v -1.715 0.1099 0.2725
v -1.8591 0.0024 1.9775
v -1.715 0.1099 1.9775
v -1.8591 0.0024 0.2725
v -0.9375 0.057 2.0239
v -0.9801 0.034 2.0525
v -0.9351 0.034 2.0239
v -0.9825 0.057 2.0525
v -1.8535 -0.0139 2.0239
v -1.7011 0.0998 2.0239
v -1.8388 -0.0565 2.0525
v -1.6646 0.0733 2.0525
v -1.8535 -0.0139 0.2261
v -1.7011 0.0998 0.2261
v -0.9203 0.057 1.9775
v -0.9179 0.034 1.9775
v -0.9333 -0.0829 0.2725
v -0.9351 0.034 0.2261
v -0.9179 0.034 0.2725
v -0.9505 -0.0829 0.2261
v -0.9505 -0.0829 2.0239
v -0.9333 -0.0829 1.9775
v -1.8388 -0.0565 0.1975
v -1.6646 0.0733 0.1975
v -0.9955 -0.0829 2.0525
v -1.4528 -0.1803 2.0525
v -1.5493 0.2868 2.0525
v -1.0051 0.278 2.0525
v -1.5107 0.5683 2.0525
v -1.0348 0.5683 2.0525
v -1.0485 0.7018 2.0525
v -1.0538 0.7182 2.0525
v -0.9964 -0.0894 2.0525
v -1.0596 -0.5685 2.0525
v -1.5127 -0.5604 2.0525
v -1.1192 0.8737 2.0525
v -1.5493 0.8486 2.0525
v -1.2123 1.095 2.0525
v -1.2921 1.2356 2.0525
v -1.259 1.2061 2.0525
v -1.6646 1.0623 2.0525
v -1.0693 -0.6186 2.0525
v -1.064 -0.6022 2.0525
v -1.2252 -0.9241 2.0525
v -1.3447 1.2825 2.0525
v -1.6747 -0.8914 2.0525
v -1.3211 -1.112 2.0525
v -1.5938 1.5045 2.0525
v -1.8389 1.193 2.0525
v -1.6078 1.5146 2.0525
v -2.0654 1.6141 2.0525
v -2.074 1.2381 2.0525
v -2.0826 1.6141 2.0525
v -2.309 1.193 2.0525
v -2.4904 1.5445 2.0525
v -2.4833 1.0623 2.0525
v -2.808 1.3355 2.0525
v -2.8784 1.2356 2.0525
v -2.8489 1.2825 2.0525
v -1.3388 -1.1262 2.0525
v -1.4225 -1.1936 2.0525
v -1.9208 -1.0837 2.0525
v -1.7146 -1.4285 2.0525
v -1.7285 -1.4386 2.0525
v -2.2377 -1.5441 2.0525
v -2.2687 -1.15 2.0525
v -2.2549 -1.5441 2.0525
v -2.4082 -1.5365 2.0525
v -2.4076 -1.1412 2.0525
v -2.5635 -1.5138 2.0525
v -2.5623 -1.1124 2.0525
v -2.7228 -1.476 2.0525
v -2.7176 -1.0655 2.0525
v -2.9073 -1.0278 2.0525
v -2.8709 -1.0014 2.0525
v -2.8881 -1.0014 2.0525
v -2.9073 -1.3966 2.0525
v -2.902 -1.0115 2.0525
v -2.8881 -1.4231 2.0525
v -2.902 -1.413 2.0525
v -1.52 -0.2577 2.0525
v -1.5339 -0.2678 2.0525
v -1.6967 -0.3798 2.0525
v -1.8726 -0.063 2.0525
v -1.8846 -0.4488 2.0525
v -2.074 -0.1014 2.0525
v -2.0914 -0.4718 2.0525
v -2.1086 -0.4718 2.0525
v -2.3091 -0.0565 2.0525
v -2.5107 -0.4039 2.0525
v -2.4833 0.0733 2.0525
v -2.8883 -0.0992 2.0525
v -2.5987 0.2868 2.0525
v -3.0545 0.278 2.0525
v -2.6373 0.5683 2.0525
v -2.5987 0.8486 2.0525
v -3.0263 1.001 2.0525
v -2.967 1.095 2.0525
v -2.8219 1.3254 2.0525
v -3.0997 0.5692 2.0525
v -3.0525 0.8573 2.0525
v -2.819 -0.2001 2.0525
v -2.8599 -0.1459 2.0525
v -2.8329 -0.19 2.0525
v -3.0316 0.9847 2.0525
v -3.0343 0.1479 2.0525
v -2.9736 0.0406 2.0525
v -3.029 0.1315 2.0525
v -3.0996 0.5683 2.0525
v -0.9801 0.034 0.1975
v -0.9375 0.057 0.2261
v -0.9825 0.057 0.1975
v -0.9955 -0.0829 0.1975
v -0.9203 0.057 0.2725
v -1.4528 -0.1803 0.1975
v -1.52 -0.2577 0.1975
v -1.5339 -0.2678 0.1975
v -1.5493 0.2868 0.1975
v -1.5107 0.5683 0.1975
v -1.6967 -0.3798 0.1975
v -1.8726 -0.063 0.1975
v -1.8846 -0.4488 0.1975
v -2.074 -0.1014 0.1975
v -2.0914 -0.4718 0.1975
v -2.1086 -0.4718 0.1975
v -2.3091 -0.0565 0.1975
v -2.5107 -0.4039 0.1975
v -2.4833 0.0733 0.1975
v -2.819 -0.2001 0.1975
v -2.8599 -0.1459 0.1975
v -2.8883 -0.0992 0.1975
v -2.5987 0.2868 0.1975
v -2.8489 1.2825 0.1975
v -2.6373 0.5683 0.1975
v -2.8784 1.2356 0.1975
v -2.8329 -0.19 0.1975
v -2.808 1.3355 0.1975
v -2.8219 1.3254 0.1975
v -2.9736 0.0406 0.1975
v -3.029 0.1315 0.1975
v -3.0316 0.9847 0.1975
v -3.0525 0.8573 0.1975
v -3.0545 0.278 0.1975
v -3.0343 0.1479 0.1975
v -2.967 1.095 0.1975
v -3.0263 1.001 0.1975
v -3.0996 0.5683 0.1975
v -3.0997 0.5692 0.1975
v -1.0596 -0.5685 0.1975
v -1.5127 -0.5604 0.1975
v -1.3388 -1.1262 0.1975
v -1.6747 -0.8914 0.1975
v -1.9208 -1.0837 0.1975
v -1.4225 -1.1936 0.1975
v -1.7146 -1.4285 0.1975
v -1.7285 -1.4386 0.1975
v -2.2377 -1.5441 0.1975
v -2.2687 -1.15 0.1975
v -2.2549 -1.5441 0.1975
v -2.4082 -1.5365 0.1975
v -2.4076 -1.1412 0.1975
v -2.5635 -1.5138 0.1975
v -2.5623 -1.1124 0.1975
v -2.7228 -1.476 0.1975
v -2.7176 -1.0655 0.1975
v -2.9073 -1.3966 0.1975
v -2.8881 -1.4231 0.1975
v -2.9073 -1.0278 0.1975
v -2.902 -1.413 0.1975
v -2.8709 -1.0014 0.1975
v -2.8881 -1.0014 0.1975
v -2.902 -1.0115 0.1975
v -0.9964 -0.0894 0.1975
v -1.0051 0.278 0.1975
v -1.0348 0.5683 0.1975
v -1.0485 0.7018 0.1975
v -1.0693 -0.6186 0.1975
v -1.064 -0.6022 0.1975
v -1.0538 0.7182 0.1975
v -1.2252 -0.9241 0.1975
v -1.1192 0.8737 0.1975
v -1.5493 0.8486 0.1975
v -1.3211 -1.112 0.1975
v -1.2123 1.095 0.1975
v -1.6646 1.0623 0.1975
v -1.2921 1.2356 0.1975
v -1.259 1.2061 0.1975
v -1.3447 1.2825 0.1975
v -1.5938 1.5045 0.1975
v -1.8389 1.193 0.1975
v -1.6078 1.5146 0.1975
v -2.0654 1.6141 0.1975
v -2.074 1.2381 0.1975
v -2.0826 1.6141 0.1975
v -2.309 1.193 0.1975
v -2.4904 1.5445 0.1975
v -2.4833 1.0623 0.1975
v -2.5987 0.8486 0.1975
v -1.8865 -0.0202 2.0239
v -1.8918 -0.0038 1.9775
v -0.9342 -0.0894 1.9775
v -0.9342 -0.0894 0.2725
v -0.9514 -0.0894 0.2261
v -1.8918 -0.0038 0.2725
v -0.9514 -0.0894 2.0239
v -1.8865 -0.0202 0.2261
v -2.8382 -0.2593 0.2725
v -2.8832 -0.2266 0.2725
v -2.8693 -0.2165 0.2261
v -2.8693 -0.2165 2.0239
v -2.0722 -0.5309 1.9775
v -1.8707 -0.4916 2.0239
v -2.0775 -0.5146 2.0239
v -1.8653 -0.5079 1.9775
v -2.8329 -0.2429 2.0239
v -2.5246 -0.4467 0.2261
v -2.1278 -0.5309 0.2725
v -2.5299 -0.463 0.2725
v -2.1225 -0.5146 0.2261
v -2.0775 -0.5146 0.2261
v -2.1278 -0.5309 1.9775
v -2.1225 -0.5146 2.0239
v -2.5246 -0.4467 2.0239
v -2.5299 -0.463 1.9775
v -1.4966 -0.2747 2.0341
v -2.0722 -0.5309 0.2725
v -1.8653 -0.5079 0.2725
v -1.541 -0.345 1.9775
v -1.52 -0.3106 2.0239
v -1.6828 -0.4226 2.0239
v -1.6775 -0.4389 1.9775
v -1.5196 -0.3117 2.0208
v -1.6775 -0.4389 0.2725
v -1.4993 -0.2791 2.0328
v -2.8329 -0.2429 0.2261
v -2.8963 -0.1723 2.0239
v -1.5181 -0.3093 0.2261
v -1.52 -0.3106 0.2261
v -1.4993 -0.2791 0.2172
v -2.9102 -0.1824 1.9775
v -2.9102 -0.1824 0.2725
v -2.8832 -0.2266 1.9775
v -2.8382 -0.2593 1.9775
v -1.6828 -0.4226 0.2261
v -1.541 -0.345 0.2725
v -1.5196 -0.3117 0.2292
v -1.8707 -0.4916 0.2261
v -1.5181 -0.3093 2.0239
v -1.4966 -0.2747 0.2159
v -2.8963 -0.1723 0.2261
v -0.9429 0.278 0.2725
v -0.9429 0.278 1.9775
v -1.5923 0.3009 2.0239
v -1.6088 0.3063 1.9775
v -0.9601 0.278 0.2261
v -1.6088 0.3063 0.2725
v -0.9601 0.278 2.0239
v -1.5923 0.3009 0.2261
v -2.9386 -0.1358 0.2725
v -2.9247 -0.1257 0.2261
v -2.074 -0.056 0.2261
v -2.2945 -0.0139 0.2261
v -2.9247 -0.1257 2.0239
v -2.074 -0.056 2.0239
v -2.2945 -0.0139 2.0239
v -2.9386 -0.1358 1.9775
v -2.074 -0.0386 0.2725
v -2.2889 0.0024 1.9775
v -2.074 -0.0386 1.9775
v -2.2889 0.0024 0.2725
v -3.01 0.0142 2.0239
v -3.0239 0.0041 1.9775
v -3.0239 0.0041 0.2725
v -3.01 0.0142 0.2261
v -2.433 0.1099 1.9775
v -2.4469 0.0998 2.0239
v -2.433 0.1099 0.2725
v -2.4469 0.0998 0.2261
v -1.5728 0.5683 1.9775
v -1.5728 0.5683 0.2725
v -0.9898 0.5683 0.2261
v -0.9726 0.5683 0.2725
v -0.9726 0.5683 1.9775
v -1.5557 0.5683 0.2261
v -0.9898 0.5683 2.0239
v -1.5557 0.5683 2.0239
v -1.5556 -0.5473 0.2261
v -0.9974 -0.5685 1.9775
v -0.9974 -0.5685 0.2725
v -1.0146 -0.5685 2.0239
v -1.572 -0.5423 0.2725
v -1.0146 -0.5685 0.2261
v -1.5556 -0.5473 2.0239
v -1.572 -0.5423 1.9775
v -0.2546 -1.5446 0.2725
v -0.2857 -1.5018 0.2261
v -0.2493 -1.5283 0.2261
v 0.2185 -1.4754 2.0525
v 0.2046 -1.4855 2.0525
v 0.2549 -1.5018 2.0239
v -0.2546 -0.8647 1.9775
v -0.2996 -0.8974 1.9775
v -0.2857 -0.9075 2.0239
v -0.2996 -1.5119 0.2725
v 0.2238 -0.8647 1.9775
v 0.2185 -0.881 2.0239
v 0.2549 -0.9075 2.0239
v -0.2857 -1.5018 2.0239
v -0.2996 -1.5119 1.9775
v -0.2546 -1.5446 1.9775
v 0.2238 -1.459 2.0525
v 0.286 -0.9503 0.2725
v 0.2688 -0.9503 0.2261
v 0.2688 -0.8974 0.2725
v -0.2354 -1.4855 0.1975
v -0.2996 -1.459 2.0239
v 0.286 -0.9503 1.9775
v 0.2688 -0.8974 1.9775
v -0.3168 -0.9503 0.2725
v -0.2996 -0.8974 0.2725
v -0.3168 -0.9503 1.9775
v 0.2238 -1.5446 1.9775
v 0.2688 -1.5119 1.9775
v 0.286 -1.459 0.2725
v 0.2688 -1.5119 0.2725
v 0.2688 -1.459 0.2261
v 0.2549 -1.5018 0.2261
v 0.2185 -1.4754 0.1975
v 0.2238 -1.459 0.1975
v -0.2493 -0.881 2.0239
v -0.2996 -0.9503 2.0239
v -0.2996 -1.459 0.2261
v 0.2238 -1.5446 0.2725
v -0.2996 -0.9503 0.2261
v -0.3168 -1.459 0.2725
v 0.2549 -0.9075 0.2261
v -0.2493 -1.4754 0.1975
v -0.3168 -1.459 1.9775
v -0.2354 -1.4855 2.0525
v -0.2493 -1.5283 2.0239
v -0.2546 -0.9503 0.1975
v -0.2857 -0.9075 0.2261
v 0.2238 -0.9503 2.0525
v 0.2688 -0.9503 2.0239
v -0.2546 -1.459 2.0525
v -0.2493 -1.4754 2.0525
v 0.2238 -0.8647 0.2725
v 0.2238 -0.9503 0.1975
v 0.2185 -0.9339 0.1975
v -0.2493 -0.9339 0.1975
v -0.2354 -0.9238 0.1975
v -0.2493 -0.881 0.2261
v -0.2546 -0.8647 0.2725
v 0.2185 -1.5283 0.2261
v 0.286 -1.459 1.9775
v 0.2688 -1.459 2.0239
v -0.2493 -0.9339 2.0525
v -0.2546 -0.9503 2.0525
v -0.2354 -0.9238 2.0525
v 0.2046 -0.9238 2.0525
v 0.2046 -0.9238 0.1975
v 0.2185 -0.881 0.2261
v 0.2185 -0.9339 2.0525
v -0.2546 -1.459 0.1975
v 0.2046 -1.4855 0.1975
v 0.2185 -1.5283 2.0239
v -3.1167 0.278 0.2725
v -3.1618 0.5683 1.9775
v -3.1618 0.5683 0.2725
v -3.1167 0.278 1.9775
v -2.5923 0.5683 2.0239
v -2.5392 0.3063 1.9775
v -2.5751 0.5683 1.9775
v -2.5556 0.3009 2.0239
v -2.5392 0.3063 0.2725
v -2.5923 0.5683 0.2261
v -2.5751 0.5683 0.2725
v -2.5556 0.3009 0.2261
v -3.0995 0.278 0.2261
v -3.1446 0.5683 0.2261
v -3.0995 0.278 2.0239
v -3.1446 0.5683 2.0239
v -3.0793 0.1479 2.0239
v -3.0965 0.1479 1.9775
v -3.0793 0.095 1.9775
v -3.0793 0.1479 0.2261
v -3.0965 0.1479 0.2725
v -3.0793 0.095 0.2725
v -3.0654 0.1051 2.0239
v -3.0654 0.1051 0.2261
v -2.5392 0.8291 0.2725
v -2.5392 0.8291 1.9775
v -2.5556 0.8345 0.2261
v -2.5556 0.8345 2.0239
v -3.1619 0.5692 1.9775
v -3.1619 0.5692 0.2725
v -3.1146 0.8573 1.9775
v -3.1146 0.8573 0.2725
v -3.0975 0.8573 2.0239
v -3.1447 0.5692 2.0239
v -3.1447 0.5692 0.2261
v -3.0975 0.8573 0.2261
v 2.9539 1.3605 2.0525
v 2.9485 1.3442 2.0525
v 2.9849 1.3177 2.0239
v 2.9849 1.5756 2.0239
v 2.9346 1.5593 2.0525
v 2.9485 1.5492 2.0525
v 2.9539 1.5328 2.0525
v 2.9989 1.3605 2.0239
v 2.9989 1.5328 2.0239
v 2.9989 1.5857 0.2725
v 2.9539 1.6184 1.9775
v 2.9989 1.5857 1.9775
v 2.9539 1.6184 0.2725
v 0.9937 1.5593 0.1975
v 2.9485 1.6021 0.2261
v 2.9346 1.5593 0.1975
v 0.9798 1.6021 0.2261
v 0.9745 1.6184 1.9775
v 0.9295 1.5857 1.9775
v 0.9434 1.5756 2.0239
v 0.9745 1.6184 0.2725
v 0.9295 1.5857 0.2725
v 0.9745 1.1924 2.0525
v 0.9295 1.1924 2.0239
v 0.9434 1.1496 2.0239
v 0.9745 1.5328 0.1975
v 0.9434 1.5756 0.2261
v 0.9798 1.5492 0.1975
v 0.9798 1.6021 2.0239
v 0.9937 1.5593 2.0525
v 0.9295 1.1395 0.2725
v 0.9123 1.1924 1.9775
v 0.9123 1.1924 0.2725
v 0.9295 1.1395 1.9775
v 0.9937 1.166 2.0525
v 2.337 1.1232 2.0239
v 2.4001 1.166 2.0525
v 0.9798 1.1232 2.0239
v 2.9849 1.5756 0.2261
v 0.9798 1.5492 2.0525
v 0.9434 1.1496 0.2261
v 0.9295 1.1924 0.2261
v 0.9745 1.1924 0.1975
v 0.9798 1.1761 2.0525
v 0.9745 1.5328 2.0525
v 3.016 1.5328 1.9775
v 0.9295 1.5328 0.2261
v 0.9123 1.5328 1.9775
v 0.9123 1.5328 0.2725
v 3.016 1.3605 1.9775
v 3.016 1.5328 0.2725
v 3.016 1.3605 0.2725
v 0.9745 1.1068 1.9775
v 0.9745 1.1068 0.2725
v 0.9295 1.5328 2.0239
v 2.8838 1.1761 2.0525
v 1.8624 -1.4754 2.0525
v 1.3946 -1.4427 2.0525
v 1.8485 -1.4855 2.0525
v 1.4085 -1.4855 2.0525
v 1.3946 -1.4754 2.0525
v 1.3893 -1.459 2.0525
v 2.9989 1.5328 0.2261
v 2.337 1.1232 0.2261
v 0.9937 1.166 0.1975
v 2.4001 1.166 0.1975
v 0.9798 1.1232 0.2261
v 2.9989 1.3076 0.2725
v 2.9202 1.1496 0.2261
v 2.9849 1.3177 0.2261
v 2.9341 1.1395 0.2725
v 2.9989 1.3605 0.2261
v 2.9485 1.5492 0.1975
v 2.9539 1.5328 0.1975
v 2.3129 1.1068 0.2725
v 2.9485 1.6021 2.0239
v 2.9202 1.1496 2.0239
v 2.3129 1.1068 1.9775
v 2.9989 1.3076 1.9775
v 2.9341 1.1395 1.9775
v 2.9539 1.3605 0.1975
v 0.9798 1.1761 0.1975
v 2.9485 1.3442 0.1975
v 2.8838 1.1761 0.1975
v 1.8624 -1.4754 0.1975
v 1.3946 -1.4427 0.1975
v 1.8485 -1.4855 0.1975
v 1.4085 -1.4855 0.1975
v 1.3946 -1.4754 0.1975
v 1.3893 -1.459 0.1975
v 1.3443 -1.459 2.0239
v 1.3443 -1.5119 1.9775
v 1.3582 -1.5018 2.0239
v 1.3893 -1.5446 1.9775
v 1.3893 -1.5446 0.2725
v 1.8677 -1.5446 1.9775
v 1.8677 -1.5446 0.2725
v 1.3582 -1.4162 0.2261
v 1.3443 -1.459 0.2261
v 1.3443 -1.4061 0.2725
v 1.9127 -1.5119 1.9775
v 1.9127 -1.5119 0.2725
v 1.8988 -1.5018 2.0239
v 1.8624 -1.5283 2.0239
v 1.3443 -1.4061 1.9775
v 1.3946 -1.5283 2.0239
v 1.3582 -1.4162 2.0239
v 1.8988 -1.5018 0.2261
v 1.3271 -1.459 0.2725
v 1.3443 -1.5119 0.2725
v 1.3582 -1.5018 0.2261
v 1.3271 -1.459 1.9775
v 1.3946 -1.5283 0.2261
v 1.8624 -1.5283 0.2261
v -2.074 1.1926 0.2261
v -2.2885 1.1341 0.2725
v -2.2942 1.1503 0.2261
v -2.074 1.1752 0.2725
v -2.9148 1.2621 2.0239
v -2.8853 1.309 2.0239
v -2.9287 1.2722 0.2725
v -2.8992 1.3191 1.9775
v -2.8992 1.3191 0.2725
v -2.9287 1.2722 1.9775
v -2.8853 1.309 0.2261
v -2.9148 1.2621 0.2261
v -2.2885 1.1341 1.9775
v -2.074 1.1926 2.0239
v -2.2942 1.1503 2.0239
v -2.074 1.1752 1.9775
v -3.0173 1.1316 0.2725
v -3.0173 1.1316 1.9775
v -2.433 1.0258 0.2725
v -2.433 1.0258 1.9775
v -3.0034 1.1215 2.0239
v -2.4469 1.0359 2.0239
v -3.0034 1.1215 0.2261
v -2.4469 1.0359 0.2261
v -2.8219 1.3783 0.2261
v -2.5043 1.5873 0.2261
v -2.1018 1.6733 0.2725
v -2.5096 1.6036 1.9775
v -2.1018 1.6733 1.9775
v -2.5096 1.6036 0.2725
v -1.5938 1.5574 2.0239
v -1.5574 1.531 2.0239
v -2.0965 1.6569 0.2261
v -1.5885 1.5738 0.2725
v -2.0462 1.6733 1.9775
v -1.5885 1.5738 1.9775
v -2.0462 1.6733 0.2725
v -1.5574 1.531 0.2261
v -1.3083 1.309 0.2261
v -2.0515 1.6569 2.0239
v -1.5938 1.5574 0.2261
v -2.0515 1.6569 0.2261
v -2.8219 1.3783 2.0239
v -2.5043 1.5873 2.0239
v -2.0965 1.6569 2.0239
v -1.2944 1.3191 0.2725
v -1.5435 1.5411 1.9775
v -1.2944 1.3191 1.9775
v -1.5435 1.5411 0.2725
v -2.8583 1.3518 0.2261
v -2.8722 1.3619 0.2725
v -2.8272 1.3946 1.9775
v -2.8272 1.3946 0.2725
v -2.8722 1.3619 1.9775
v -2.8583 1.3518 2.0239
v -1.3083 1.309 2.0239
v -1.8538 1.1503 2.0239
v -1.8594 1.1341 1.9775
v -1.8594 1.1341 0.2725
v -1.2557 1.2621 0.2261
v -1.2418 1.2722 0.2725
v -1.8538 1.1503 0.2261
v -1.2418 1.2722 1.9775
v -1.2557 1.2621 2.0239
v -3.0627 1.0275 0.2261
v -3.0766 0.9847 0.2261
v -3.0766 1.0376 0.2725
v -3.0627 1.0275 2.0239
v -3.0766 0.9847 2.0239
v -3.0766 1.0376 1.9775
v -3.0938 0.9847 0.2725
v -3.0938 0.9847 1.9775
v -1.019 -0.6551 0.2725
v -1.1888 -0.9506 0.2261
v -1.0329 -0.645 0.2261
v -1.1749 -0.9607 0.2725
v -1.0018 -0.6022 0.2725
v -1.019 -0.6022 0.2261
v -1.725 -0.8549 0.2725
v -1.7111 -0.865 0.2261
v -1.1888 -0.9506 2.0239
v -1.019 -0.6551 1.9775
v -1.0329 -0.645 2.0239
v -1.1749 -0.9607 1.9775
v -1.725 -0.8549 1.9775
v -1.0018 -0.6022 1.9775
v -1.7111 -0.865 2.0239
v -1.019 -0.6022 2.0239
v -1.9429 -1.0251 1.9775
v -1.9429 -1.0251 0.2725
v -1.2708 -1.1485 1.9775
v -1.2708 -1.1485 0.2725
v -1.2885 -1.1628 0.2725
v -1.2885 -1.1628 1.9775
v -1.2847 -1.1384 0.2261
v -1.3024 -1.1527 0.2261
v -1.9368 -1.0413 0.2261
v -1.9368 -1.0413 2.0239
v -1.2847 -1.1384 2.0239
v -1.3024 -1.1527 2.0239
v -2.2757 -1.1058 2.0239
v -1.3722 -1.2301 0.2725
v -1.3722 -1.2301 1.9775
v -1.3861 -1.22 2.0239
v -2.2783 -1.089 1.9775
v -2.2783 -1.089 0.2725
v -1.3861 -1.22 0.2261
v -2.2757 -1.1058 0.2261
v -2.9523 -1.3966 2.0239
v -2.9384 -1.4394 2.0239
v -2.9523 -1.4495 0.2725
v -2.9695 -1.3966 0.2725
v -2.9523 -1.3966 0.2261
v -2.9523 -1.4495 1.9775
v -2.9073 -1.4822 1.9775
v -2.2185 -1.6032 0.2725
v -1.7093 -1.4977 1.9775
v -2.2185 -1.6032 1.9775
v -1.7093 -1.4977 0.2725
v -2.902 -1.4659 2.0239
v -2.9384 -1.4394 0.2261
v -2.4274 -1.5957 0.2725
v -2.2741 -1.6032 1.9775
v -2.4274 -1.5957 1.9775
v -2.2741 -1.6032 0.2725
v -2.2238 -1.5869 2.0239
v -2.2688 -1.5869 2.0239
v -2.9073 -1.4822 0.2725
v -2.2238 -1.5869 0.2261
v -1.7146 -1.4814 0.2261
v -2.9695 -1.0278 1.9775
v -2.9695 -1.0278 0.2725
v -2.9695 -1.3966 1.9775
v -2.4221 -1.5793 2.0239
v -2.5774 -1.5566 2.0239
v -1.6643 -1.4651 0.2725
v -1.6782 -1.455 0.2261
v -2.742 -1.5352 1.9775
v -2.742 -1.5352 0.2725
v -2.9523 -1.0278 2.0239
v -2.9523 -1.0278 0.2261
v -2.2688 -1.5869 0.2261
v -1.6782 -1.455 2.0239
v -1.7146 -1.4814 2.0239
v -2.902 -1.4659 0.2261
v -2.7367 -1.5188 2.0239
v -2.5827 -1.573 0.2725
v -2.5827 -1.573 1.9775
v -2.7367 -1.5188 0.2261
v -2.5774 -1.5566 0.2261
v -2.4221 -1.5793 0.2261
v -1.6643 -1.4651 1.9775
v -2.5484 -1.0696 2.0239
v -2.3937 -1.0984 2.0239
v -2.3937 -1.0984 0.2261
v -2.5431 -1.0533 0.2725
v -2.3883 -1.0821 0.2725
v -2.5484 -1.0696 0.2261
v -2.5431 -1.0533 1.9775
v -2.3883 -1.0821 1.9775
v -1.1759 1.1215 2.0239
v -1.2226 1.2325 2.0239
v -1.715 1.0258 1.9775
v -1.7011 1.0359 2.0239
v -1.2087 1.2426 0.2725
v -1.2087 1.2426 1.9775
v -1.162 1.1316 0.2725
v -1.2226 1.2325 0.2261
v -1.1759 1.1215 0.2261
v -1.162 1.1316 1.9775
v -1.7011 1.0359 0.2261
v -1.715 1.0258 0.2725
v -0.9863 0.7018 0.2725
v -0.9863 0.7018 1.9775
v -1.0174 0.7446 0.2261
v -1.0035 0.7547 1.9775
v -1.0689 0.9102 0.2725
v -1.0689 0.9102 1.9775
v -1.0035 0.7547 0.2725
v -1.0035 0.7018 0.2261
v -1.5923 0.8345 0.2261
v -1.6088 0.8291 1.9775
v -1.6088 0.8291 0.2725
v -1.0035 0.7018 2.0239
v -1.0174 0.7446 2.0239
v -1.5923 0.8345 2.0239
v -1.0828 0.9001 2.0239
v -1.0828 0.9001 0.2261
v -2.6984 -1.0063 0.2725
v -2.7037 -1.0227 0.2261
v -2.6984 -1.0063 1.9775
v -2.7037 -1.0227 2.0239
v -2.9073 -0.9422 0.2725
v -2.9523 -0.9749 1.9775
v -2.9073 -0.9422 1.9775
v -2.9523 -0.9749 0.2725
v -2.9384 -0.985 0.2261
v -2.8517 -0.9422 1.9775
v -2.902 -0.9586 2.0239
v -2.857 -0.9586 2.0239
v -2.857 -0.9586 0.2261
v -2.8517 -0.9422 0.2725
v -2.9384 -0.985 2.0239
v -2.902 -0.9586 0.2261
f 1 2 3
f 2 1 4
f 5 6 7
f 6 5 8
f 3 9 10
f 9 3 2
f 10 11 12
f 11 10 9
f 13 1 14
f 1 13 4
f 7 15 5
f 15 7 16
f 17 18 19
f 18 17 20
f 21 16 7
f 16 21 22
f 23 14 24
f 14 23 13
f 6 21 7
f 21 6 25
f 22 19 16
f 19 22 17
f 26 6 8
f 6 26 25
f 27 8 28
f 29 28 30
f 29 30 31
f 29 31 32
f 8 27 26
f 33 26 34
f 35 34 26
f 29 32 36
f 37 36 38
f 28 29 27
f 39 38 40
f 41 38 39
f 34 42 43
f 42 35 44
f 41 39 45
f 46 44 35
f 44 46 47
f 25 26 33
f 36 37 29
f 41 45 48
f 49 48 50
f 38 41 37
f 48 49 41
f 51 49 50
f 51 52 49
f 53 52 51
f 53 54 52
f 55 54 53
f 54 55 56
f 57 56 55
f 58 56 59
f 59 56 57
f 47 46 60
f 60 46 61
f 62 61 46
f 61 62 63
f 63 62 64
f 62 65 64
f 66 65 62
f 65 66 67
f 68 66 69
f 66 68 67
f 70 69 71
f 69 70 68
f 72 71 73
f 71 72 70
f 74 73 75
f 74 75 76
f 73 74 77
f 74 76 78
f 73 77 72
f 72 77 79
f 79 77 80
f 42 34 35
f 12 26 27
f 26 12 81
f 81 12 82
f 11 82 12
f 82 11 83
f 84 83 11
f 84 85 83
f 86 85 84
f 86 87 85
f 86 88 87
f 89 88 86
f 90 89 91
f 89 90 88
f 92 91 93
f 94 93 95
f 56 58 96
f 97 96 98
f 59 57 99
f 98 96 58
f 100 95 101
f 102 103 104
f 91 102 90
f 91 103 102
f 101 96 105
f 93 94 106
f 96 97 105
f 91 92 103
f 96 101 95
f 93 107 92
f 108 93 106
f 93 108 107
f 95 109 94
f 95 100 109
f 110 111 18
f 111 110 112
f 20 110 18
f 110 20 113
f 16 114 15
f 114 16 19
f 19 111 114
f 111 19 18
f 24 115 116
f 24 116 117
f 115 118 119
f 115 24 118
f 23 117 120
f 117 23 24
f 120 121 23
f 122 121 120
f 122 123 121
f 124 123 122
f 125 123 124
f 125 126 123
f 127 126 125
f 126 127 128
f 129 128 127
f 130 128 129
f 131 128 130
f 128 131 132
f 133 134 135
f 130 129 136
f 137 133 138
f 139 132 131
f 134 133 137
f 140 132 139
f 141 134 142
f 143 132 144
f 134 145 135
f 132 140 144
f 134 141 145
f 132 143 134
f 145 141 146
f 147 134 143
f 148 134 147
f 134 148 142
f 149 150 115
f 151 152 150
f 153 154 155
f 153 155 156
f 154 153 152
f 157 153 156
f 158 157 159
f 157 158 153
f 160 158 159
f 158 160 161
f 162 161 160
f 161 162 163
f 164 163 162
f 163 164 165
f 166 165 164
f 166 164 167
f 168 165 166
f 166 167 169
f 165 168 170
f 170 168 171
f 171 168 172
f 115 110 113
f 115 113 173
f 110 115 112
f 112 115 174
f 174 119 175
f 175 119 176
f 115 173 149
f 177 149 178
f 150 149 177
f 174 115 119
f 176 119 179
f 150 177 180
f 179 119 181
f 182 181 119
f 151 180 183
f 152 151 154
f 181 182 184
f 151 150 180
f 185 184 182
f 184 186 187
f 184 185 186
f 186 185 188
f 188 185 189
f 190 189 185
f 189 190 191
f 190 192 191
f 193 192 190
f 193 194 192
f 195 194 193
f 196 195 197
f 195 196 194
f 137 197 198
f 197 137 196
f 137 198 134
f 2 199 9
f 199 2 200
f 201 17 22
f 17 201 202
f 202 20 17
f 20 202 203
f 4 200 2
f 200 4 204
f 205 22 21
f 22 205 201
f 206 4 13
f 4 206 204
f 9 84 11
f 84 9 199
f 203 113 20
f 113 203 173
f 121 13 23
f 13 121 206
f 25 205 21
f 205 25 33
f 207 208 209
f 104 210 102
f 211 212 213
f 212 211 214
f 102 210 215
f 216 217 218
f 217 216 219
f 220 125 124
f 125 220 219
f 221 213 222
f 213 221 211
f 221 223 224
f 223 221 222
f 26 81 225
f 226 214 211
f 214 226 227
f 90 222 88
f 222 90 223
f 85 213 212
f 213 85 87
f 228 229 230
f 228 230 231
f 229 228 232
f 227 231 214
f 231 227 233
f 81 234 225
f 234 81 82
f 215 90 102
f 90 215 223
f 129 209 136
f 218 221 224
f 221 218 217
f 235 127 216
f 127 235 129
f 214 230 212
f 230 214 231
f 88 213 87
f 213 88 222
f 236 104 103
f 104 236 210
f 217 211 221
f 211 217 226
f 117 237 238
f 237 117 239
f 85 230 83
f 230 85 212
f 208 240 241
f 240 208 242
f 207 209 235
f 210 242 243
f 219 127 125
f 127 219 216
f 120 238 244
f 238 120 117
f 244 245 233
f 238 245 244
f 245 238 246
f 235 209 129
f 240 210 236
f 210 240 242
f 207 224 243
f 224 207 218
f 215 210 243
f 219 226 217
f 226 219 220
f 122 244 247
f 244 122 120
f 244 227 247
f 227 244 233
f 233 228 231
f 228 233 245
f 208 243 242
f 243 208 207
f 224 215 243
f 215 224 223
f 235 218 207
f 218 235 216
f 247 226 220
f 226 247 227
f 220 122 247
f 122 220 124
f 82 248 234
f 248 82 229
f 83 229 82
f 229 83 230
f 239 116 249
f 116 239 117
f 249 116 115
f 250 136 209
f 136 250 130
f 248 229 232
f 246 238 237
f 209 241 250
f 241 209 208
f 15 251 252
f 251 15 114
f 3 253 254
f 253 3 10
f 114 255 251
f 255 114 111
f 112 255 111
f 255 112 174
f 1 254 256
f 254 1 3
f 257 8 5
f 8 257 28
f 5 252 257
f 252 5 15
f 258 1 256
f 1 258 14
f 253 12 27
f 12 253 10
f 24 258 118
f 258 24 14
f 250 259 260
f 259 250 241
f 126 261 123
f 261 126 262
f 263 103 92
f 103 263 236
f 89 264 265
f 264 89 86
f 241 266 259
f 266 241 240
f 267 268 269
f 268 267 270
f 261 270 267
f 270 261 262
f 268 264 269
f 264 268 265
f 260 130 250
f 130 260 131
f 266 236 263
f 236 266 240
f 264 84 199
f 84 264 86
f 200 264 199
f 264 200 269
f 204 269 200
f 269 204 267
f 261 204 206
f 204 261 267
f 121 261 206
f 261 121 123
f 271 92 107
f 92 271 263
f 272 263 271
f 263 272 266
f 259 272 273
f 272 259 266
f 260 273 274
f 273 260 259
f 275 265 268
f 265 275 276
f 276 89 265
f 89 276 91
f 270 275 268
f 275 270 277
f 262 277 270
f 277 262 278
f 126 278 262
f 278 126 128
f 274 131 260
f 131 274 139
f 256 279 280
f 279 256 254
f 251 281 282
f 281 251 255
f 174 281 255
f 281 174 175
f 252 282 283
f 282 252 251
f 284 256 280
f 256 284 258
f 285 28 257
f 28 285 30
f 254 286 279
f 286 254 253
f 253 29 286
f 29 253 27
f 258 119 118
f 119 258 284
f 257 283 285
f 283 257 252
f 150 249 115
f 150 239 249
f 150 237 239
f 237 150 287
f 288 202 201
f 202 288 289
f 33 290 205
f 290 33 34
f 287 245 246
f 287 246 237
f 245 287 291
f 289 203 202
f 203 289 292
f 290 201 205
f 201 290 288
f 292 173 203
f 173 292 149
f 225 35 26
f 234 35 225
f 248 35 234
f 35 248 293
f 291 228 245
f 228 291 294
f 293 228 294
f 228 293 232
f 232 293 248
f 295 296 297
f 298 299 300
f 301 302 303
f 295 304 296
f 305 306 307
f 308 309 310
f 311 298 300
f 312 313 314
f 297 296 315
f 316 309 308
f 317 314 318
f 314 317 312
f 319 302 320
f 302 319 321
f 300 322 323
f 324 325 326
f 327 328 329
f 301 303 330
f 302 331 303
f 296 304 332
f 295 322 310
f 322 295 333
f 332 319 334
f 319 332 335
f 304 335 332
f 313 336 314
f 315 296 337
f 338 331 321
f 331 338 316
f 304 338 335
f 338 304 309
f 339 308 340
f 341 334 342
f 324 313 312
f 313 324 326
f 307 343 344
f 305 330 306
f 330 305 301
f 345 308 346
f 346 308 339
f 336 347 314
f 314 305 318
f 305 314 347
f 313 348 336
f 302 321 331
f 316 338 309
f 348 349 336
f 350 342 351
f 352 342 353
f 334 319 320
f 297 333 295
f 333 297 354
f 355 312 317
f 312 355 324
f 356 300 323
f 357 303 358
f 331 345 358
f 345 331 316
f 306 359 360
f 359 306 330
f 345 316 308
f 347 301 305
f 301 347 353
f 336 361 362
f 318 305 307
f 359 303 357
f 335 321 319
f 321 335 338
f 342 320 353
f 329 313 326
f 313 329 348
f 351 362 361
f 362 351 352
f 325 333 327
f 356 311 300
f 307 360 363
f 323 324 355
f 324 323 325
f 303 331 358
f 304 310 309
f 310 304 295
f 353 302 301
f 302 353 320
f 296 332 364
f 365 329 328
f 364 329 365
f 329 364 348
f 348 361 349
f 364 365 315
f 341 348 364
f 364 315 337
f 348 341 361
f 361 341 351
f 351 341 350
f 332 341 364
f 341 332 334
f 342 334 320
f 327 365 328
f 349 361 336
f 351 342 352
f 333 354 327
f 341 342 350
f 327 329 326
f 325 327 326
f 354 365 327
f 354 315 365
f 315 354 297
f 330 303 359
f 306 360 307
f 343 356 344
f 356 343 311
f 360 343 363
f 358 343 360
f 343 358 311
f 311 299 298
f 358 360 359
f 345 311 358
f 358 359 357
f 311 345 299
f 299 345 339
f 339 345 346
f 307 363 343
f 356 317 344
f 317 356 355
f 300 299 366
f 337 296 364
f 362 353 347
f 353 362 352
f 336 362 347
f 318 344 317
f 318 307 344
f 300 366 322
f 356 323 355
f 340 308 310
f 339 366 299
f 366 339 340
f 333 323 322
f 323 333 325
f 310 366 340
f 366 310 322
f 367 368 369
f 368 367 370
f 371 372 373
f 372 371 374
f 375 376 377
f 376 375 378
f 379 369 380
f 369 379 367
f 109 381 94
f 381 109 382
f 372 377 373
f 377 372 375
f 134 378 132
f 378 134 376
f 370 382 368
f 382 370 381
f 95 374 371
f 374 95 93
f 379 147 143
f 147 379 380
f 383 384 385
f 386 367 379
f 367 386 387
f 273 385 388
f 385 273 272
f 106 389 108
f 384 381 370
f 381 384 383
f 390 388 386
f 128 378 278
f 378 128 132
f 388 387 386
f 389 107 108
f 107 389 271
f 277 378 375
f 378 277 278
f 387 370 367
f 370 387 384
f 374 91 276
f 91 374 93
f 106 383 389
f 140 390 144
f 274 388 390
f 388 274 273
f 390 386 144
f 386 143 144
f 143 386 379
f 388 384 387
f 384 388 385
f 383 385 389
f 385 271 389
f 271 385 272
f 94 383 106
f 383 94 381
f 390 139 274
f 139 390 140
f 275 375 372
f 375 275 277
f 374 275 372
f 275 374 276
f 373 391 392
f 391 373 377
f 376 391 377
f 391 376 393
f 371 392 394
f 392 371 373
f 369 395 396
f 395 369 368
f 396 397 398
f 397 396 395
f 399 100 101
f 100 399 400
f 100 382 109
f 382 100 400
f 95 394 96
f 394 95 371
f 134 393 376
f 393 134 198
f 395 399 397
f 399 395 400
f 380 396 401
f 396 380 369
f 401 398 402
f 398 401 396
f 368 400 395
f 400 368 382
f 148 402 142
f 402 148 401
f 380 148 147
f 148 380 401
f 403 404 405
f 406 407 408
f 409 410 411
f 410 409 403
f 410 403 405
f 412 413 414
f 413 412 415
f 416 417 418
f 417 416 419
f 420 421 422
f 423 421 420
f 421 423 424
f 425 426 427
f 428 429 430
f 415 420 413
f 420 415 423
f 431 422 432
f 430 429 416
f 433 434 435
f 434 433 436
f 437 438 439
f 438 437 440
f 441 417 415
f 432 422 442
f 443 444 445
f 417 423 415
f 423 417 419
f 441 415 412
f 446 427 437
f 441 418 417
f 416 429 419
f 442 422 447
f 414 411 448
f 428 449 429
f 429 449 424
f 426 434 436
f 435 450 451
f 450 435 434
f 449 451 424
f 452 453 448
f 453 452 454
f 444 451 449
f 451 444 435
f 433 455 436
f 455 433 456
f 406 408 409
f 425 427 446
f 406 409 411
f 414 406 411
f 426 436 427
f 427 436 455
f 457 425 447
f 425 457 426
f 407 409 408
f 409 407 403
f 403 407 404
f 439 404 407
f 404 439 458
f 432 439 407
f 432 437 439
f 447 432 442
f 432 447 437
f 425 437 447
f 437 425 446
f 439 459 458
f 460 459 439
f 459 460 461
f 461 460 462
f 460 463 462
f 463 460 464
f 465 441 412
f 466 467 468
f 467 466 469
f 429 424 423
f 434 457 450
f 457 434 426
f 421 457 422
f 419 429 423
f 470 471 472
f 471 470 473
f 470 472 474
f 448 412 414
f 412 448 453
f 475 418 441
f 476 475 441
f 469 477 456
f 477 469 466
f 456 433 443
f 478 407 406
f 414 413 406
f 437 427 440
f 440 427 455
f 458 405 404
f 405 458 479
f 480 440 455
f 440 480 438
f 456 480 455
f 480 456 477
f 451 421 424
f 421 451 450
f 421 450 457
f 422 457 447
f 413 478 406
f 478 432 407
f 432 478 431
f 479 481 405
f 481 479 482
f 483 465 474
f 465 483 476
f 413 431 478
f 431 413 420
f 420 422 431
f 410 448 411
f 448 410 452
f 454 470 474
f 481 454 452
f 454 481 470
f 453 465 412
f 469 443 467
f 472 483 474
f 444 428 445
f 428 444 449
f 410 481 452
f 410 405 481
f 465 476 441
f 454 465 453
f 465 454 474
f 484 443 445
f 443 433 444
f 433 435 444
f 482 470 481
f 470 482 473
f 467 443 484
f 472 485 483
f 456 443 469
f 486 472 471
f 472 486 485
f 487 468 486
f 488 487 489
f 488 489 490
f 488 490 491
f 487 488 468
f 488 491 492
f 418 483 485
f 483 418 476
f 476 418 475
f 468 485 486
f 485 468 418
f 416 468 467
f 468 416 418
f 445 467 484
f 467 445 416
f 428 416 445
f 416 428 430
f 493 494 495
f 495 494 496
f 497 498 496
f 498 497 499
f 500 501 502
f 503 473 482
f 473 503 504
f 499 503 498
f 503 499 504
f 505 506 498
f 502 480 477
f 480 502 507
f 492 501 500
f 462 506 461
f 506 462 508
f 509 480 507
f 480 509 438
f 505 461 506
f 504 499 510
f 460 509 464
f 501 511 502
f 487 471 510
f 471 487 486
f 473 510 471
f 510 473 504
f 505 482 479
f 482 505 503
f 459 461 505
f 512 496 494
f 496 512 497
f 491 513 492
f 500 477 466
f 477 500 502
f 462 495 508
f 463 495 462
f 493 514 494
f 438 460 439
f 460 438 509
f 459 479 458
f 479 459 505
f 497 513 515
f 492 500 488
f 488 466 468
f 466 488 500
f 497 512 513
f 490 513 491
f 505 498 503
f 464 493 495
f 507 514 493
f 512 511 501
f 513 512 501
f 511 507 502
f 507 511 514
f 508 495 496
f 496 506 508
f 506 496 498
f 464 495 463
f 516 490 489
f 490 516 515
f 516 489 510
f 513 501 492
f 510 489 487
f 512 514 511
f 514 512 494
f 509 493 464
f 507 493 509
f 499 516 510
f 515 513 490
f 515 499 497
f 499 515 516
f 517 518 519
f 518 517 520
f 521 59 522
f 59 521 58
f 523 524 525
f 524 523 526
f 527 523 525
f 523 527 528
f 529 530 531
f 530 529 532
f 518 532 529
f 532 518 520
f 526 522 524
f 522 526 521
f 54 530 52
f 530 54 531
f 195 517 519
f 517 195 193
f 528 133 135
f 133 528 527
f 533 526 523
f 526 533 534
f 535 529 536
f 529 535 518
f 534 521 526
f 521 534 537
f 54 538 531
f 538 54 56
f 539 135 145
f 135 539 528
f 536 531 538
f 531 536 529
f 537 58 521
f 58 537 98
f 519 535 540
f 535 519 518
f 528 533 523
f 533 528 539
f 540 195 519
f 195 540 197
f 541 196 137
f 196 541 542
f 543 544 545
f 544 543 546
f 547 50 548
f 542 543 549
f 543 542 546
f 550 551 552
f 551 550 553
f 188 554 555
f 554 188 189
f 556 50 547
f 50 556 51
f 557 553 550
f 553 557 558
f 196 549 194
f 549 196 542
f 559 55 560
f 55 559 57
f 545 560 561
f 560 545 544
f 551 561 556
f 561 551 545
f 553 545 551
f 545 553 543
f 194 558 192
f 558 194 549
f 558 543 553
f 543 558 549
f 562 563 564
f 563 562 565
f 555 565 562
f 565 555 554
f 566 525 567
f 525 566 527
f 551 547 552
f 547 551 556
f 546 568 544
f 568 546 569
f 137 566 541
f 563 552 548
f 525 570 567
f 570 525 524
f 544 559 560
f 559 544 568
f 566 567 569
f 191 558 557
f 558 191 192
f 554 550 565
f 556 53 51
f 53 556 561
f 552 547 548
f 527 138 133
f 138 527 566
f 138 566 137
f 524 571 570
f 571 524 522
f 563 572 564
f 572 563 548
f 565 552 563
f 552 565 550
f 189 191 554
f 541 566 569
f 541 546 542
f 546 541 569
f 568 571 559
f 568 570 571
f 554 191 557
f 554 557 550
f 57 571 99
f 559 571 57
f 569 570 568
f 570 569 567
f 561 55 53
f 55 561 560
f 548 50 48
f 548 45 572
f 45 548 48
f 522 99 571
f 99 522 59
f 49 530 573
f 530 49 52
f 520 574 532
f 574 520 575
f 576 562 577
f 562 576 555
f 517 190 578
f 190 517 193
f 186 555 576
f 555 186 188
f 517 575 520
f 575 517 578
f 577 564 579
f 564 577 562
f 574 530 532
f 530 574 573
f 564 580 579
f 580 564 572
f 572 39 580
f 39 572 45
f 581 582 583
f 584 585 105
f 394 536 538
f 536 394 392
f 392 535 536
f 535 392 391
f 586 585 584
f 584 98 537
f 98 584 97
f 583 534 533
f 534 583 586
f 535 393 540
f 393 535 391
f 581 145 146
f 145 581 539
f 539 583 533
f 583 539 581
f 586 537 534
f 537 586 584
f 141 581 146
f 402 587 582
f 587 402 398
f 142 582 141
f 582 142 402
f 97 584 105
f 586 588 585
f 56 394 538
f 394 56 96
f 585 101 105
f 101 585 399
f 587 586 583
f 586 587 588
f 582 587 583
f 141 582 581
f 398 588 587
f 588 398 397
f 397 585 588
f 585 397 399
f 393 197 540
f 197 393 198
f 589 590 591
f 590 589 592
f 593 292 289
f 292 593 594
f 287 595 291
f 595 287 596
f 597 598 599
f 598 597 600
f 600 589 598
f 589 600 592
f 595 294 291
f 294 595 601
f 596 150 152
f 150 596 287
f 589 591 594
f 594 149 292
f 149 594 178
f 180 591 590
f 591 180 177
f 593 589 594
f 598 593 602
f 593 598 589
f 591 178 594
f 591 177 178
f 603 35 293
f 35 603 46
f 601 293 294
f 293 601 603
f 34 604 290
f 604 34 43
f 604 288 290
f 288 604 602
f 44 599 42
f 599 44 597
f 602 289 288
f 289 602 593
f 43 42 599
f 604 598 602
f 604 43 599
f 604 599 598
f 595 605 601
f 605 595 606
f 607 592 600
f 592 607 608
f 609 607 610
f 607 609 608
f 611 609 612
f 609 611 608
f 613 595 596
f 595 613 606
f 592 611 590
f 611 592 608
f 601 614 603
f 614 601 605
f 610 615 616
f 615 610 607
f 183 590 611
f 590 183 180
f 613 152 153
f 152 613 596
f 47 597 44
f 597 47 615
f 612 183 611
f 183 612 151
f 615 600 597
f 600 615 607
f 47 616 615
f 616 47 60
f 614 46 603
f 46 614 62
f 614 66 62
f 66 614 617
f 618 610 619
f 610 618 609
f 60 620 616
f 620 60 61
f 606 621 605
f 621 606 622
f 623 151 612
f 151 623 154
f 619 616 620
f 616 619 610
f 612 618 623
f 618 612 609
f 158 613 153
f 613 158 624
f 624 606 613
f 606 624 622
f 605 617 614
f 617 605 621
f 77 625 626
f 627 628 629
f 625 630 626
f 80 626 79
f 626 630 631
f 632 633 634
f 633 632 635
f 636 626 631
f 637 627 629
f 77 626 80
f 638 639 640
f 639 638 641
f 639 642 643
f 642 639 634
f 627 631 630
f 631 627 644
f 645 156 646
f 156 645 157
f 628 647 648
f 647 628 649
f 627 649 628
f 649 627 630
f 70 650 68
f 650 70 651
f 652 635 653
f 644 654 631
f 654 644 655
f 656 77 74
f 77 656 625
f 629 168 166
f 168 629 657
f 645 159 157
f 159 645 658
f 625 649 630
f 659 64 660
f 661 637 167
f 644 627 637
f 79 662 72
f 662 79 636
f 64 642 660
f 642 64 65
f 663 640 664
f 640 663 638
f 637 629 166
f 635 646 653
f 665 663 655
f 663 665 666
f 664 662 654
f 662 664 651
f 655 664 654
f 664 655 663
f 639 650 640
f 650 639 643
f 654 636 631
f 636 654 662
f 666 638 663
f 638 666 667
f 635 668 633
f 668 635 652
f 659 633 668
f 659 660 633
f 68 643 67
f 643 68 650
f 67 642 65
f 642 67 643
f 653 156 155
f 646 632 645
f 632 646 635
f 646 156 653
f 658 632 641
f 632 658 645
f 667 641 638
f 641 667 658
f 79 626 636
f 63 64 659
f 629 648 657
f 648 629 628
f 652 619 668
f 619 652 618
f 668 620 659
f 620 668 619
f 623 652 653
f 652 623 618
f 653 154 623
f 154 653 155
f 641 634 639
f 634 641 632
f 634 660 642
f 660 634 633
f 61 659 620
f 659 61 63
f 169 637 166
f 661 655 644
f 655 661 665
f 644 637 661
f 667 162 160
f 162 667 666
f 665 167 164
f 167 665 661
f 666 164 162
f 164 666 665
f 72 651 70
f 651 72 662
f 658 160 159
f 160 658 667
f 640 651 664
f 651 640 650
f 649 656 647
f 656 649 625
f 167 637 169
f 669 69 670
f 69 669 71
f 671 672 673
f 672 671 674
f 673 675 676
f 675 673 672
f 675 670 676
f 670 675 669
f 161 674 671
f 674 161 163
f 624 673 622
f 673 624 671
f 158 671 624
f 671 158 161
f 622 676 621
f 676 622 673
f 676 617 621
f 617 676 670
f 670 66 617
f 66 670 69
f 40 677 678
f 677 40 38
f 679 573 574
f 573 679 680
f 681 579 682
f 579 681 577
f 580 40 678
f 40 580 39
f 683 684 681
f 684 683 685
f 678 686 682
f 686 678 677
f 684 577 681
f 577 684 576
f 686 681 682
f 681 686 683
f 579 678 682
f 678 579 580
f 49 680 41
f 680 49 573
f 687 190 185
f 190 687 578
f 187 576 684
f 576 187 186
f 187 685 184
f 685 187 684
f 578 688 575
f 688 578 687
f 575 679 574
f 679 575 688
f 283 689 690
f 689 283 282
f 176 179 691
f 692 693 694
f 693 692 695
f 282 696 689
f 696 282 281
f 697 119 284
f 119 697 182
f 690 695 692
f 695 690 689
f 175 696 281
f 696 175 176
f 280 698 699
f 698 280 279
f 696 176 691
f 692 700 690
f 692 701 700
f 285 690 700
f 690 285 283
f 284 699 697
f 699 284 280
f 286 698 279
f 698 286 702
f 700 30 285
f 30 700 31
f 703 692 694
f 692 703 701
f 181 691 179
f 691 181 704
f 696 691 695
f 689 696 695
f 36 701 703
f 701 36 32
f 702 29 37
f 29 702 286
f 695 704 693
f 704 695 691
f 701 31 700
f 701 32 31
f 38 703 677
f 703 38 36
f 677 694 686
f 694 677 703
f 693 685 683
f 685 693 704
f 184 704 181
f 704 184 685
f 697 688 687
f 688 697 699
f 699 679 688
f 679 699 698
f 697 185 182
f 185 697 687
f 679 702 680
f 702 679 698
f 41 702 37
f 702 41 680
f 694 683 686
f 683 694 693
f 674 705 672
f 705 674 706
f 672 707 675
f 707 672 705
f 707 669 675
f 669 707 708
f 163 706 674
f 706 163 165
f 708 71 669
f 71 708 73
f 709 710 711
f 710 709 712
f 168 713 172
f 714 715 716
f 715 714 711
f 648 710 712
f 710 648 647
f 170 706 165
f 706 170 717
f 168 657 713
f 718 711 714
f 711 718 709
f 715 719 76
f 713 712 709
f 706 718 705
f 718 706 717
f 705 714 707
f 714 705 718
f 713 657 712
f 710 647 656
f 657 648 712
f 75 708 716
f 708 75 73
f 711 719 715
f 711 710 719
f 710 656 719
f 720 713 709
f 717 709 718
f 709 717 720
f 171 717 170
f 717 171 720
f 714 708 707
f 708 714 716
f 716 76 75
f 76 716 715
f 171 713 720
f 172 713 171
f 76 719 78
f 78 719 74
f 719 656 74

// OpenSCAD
font = "Dice\\-Face:style=Regular";

module extrude_text(some_text = "9.7", font_scale = 100, vertical_offset = 0, height = 3, multiplier = 1,
                    do_draw_text = true, offset_four = 0, extrude_multiplier = 1, round_edge = true) {
  extrude_it();

  module extrude_it() {
    radius = 0.015 * height;
    depth = round_edge ? .75 - radius : .75;
    size = round_edge ? height - radius : height;
    has_period = false;
    two_digits = false;
    is_twenty = false;
    x = 0;

    if (round_edge) {
      echo("rendering rounded text: ", some_text, size, height, depth, radius * 2);
      translate([ x, vertical_offset * multiplier, -depth + 1 - radius / 2 ])
      minkowski() {
	linear_extrude(height = depth + 1) text(text = some_text, size = size, spacing = 1 + radius,
	                                        valign = "center", halign = "center", font = font, $fn = 10);
resize([0, 0, .15]) 	
          sphere(radius*2, $fn = 10);
      }
    } else {
      echo("rendering text: ", some_text, size, height, multiplier);
      translate([ x, vertical_offset * multiplier, -depth + 1 ])
      linear_extrude(height = depth + 1, $fn = 50)
          text(text = some_text, size = size, valign = "center", halign = "center", font = font);
    }
  }
}

color("pink", .75) extrude_text();

ht = 0.015 * 3;

*color("pink", .75) resize([0, 0, .5]) sphere(ht, $fn=50);
*translate([ -.15, 0, 1 ])
extrude_text(round_edge = false);

// ext_style =
//     {BasedOnStyle : Google, UseTab : ForIndentation, ColumnLimit : 120, StatementMacros : [ rotate, translate ]};
